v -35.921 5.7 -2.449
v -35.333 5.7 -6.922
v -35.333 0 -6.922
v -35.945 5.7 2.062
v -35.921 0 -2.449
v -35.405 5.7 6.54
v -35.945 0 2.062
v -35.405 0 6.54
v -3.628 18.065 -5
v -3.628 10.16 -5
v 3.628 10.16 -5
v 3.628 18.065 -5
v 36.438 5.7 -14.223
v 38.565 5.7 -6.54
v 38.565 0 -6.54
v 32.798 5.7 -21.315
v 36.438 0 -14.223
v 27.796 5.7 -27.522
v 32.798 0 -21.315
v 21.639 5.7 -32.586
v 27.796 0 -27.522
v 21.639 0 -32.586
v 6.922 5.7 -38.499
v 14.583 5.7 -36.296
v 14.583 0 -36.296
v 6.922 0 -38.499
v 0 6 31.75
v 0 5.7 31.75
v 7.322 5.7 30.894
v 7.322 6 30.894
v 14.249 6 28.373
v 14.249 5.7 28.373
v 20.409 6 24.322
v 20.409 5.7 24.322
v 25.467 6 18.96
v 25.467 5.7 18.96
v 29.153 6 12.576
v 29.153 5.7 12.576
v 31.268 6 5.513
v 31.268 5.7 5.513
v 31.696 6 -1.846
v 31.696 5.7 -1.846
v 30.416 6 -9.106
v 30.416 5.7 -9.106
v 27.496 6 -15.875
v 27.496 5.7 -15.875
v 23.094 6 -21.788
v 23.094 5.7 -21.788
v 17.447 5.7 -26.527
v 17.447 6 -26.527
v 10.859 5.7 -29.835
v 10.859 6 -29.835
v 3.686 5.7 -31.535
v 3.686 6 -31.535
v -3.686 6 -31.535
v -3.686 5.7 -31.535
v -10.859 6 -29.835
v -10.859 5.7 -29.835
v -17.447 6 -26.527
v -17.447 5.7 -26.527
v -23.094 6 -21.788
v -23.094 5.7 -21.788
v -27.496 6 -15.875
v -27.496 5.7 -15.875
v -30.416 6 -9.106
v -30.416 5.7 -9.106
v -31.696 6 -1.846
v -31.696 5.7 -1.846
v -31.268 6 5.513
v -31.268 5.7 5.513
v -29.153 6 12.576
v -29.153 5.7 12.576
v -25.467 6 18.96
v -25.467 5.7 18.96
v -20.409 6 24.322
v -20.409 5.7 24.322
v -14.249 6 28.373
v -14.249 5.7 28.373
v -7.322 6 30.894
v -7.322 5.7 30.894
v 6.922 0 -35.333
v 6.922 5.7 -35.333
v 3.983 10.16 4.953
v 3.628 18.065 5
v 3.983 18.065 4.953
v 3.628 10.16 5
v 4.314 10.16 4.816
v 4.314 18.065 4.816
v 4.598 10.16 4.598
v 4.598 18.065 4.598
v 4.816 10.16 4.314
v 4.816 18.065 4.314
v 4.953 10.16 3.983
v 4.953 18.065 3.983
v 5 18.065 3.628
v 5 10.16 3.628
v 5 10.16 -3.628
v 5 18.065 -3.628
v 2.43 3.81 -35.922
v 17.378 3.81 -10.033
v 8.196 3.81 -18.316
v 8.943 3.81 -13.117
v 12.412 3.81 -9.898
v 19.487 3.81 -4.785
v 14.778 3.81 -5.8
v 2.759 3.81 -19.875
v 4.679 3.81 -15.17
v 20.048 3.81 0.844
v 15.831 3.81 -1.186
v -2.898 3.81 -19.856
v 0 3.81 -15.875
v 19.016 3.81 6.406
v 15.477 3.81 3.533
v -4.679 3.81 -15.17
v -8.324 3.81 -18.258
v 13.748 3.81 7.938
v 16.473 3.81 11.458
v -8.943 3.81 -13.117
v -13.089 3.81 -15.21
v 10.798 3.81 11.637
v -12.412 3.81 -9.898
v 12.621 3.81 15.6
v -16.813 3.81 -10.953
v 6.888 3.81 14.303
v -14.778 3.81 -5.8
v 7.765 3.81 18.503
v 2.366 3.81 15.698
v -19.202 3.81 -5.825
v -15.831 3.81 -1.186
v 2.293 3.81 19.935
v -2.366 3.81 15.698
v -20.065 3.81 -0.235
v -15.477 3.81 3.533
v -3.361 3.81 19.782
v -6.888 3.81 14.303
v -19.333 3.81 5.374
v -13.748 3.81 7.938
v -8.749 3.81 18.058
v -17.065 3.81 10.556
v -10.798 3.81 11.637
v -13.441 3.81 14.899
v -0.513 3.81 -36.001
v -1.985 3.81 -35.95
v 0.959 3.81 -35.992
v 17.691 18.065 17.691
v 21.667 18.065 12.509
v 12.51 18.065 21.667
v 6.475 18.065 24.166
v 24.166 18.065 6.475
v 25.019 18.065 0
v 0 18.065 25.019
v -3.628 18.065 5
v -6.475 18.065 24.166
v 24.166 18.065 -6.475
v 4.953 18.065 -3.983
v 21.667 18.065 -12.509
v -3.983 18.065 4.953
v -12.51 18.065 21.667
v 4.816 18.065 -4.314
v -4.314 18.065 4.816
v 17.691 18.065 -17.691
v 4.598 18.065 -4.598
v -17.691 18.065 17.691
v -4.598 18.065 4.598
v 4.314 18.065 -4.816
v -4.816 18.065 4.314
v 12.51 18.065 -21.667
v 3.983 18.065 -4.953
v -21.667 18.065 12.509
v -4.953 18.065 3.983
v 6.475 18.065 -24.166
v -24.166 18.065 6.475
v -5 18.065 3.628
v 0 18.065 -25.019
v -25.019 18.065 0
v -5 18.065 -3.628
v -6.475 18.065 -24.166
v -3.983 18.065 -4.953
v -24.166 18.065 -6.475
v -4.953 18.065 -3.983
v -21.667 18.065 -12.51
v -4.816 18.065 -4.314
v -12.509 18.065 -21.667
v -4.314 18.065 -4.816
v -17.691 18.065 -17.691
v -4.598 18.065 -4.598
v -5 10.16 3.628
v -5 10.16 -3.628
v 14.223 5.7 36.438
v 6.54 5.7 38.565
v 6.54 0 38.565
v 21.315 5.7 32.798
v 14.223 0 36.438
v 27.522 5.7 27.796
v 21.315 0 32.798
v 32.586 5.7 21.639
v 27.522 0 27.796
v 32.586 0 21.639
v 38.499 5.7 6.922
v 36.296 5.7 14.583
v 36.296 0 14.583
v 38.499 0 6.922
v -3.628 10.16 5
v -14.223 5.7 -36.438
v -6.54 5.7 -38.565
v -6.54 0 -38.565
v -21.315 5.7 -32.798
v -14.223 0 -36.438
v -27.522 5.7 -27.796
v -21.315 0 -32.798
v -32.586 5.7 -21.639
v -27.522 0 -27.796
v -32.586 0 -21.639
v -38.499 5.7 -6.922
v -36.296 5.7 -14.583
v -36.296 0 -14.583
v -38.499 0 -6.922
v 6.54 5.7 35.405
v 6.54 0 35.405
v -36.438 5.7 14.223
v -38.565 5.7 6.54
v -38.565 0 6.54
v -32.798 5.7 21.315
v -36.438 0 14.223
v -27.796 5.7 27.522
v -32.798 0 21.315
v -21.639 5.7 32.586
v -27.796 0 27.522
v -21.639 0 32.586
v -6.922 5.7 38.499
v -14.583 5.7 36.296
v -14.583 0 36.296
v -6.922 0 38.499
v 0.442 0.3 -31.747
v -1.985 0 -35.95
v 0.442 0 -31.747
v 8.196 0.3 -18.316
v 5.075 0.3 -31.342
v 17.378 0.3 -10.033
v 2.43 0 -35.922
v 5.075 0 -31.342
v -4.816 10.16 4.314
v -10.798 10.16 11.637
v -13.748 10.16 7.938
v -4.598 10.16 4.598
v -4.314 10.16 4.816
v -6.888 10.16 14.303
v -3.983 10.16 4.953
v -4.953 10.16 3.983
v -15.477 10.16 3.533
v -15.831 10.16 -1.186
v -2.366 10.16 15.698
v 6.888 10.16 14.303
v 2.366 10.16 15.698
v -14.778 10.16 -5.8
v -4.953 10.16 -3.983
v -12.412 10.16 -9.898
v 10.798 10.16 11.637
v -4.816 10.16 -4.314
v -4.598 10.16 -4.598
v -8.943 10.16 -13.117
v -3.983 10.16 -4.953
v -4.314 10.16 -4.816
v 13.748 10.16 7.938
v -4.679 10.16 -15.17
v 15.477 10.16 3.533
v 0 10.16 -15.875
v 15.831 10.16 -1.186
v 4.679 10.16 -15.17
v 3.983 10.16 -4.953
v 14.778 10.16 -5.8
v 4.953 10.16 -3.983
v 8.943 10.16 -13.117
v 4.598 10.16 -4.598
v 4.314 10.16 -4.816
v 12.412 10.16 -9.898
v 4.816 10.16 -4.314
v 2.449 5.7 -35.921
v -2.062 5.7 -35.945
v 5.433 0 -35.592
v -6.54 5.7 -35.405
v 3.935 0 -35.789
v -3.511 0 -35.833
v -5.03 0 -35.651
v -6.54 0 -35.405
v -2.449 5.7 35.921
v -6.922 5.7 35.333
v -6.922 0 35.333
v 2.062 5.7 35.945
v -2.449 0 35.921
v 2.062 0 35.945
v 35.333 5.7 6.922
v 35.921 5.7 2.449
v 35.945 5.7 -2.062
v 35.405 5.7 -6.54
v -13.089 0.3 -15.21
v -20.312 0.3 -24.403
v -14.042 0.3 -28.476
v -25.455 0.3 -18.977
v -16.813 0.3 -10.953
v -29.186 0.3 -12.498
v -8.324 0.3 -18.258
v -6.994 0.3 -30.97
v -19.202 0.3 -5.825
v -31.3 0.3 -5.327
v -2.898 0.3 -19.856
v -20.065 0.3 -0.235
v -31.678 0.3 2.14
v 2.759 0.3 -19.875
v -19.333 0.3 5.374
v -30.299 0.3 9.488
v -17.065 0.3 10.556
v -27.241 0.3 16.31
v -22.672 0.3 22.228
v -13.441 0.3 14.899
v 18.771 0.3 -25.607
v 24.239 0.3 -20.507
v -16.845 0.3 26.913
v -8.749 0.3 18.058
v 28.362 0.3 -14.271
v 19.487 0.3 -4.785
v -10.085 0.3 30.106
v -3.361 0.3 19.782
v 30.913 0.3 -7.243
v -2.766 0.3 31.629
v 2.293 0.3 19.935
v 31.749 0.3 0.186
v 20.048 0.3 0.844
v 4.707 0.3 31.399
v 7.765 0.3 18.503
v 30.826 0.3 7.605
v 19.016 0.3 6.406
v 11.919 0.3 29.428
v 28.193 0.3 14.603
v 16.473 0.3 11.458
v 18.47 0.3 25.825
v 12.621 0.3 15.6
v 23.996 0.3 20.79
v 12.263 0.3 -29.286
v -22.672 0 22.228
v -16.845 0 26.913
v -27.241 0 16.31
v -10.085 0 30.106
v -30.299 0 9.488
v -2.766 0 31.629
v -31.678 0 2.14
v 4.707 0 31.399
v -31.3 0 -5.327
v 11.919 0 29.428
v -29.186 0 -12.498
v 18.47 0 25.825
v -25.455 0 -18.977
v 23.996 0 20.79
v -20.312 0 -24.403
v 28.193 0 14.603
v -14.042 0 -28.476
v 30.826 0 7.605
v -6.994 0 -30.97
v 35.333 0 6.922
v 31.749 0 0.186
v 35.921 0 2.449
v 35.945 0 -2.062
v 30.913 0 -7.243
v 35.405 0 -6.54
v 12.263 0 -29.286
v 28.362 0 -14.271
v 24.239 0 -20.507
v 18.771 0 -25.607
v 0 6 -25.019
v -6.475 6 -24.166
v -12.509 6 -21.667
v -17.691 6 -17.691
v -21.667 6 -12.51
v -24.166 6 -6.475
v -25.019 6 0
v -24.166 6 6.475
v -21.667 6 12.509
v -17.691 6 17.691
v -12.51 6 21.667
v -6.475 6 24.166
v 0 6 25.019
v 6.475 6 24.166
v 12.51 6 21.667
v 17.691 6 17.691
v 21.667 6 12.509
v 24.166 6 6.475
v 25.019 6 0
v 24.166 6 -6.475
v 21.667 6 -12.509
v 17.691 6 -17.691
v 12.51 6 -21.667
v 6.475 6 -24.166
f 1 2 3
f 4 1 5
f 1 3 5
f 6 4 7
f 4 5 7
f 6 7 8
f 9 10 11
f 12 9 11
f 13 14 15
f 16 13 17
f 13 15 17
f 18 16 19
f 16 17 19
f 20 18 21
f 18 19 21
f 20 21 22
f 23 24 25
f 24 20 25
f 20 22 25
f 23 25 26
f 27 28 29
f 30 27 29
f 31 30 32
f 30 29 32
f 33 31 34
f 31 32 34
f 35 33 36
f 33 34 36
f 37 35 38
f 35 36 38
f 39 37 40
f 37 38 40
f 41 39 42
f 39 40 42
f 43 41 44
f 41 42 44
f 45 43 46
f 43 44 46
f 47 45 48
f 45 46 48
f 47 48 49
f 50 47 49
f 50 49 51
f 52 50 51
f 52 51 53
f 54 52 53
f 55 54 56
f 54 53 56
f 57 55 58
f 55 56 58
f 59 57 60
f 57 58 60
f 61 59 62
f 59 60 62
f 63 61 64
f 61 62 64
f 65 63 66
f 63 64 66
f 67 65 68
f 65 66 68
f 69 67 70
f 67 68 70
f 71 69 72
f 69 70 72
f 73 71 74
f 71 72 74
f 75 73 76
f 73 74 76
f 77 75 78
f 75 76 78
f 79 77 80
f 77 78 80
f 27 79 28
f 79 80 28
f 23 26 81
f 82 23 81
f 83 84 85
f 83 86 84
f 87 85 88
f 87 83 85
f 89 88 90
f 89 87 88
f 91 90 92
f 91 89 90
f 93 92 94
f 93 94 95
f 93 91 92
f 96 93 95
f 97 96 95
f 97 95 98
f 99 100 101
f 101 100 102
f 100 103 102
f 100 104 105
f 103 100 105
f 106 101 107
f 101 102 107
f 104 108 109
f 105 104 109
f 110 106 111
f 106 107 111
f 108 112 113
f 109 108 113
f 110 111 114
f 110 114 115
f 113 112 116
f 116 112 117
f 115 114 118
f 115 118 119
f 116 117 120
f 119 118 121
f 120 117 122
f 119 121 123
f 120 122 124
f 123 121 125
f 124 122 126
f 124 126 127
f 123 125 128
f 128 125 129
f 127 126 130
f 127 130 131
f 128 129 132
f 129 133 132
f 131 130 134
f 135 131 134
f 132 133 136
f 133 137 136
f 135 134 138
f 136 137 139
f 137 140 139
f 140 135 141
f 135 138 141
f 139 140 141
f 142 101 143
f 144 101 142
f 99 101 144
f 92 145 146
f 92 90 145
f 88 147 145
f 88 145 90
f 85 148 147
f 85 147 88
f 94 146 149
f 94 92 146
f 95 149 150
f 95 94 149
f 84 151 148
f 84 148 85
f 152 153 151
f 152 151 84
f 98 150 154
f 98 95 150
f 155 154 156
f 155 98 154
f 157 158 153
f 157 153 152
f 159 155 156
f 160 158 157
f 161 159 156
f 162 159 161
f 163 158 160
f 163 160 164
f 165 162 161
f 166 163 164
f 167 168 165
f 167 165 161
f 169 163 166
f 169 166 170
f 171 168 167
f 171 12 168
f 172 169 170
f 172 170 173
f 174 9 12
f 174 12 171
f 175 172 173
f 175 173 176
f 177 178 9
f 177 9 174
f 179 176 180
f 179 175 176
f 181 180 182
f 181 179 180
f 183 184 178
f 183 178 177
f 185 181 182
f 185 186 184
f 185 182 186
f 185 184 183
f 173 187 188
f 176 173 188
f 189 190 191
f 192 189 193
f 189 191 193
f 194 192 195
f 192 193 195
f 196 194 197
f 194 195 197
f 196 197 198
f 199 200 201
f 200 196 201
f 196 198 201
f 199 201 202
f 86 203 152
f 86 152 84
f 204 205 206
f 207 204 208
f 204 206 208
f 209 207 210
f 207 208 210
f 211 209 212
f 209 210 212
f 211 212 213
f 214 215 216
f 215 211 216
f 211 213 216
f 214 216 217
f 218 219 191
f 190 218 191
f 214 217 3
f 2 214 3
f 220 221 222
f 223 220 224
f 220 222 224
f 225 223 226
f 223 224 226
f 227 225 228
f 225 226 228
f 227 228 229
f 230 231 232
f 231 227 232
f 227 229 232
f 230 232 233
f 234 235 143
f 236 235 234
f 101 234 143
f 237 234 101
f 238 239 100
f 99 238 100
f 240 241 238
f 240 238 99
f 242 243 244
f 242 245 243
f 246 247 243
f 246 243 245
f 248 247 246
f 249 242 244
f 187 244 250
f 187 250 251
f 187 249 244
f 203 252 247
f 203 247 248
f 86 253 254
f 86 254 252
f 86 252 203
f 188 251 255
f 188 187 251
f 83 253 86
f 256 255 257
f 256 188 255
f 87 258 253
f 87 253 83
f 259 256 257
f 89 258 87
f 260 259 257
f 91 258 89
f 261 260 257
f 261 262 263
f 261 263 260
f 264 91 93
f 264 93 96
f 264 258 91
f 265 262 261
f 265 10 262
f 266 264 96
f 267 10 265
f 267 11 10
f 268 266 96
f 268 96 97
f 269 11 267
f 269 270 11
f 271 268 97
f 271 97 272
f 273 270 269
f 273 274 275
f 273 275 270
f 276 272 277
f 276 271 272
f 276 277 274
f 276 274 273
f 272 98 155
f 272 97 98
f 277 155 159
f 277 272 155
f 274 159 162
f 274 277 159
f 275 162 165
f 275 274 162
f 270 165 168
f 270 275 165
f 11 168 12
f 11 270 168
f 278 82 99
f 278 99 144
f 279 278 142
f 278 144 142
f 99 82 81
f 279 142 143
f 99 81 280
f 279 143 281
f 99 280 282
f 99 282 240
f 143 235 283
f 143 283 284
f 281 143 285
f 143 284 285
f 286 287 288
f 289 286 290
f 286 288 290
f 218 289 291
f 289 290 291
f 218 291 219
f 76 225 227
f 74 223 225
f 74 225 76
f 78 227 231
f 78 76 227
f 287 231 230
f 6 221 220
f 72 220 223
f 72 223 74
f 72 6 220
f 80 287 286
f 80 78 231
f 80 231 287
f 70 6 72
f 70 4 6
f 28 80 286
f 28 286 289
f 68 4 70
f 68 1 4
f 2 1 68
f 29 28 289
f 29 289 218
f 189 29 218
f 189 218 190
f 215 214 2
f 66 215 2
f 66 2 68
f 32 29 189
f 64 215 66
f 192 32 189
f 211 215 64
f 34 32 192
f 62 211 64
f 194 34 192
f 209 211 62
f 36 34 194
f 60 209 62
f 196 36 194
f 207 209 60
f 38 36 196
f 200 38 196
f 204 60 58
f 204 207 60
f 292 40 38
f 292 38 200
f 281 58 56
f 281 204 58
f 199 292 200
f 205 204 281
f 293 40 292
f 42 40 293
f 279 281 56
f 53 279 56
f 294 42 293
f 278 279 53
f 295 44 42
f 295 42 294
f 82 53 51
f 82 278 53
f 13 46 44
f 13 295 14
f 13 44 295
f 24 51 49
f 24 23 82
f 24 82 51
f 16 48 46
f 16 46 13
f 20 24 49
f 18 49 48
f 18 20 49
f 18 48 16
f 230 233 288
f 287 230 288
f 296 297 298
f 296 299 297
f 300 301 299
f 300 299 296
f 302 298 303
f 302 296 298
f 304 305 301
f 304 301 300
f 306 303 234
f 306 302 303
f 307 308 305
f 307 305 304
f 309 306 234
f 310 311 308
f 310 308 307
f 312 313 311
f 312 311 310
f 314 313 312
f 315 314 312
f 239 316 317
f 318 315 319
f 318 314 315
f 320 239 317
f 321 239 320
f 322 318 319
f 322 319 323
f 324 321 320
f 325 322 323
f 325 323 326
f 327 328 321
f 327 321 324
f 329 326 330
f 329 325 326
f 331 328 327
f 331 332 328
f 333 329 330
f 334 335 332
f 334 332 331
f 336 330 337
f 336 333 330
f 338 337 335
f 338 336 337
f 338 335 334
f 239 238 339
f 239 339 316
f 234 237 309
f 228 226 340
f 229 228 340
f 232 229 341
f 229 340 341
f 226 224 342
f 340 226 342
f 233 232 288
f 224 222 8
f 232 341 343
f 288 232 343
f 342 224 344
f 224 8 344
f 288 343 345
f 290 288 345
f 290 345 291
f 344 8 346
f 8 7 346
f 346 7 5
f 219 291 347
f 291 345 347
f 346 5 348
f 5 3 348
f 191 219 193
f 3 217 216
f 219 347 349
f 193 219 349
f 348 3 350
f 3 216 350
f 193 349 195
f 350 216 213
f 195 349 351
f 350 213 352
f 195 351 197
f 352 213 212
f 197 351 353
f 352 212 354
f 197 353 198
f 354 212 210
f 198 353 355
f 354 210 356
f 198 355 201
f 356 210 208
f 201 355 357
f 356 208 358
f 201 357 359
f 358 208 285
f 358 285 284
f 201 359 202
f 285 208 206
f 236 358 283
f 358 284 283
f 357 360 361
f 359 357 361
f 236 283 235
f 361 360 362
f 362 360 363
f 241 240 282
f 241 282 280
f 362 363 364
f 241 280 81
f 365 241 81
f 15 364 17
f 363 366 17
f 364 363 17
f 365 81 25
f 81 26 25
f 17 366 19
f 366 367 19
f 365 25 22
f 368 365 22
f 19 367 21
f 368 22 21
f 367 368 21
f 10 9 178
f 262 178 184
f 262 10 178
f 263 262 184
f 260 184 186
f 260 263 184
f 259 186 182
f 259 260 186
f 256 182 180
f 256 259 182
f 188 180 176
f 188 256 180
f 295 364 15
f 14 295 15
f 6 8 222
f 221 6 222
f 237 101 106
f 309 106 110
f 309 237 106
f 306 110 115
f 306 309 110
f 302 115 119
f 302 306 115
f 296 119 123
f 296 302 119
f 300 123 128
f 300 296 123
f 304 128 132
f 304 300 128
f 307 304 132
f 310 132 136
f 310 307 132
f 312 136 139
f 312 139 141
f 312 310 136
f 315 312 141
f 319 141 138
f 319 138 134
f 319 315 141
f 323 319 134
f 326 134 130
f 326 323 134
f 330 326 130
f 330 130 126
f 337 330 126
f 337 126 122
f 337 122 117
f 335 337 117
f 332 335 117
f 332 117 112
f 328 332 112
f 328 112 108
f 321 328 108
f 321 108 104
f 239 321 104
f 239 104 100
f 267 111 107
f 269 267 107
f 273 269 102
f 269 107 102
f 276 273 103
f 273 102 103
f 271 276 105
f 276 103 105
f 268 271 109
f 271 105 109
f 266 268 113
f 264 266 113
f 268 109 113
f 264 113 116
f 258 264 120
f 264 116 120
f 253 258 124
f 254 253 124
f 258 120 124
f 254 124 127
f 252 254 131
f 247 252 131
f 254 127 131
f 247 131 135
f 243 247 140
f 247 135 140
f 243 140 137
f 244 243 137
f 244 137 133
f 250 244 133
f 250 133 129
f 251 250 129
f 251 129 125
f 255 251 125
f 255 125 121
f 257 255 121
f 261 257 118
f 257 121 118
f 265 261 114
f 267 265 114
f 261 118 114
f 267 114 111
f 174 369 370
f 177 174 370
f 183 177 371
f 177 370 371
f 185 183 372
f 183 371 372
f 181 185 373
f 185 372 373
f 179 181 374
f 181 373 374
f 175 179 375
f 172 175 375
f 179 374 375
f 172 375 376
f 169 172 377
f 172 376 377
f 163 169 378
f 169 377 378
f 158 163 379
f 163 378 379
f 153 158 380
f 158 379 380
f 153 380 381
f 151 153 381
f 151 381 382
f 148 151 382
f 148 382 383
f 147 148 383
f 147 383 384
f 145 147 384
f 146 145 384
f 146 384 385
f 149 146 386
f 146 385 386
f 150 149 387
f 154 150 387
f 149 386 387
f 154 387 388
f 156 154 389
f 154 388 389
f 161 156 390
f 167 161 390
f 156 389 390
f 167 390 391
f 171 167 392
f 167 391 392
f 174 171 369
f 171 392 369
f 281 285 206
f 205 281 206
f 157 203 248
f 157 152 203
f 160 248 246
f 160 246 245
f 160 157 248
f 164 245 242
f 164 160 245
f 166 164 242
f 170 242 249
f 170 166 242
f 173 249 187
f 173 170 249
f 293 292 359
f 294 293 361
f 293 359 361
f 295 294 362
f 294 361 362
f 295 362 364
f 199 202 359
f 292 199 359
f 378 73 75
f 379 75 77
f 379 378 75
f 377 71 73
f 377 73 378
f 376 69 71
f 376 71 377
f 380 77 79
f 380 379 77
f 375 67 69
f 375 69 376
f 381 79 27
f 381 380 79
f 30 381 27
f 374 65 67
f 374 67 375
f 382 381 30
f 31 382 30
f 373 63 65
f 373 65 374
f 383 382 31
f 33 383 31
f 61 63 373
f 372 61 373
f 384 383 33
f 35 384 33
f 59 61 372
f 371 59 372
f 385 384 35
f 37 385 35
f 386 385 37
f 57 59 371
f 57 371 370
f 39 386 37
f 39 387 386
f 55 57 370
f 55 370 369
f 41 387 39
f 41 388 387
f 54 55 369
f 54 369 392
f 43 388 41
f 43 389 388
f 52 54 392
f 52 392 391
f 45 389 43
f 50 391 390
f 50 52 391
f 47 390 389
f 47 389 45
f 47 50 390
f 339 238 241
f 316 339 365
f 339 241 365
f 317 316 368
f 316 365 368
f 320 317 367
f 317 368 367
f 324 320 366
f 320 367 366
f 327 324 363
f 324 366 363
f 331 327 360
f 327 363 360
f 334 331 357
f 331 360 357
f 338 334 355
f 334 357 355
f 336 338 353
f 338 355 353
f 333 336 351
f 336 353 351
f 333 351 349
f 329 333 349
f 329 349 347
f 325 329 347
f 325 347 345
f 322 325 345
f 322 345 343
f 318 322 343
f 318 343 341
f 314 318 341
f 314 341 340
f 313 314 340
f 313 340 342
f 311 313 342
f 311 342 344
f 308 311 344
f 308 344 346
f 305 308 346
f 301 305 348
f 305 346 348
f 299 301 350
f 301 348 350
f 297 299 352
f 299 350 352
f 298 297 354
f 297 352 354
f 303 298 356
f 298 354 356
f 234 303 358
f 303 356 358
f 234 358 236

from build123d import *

# Parameters (mm, degrees)
SKETCH1_W           = 10
SKETCH1_H           = 10
BOSS_EXTRUDE2_DEPTH = 6
CUT_EXTRUDE1_DEPTH  = 3.81
SKETCH3_R           = 31.75
CUT_EXTRUDE2_DEPTH  = 0.3
SKETCH4_R           = 25.019
SKETCH4_W           = 10
SKETCH4_H           = 10
BOSS_EXTRUDE3_DEPTH = 12.065
SKETCH5_R           = 15.875
CUT_EXTRUDE3_DEPTH  = 6.35
FILLET1_R           = 1.3716
CUT_EXTRUDE4_START  = -0.3
SKETCH6_R           = 54.970137174
SKETCH6_R_2         = 31.75
CUT_EXTRUDE4_DEPTH  = 0.3


with BuildPart() as part:
    # Sketch1 → Boss-Extrude2 (new body)
    with BuildSketch(Plane(origin=(0, 0, 0), x_dir=(1, 0, 0), z_dir=(0, 1, 0))):
        with BuildLine():
            Line((35.405449863, 6.5405), (38.565312338, 6.5405))
            ThreePointArc((38.565312338, 6.5405), (27.795594479, 27.522107178), (6.9215, 38.498757042))
            Line((6.9215, 38.498757042), (6.9215, 35.332942957))
            ThreePointArc((6.9215, 35.332942957), (0.19391896, 36.003977776), (-6.5405, 35.405449863))
            Line((-6.5405, 35.405449863), (-6.5405, 38.565312338))
            ThreePointArc((-6.5405, 38.565312338), (-27.522107178, 27.795594479), (-38.498757042, 6.9215))
            Line((-38.498757042, 6.9215), (-35.332942957, 6.9215))
            ThreePointArc((-35.332942957, 6.9215), (-36.003977776, 0.19391896), (-35.405449863, -6.5405))
            Line((-35.405449863, -6.5405), (-38.565312338, -6.5405))
            ThreePointArc((-38.565312338, -6.5405), (-27.795594479, -27.522107178), (-6.9215, -38.498757042))
            Line((-6.9215, -38.498757042), (-6.9215, -35.332942957))
            ThreePointArc((-6.9215, -35.332942957), (-0.19391896, -36.003977776), (6.5405, -35.405449863))
            Line((6.5405, -35.405449863), (6.5405, -38.565312338))
            ThreePointArc((6.5405, -38.565312338), (27.522107178, -27.795594479), (38.498757042, -6.9215))
            Line((38.498757042, -6.9215), (35.332942957, -6.9215))
            ThreePointArc((35.332942957, -6.9215), (36.003977776, -0.19391896), (35.405449863, 6.5405))
        make_face()
        Rectangle(SKETCH1_W, SKETCH1_H, mode=Mode.SUBTRACT)
    extrude(amount=BOSS_EXTRUDE2_DEPTH)

    # Sketch2 → Cut-Extrude1 (cut)
    with BuildSketch(Plane.XZ):
        with BuildLine():
            Line((17.377665752, -10.033), (-0.286554615, -40.628327152))
            ThreePointArc((-0.286554615, -40.628327152), (-2.416432138, -40.557415308), (-4.539661745, -40.374924792))
            Line((-4.539661745, -40.374924792), (8.196212586, -18.315743371))
            ThreePointArc((8.196212586, -18.315743371), (-13.440862054, 14.899247741), (17.377665752, -10.033))
        make_face()
    extrude(amount=-CUT_EXTRUDE1_DEPTH, mode=Mode.SUBTRACT)

    # Sketch3 → Cut-Extrude2 (cut)
    with BuildSketch(Plane.XZ):
        Circle(SKETCH3_R)
    extrude(amount=-CUT_EXTRUDE2_DEPTH, mode=Mode.SUBTRACT)

    # Sketch4 → Boss-Extrude3 (add)
    with BuildSketch(Plane(origin=(0, 6, 0), x_dir=(1, 0, 0), z_dir=(0, 1, 0))):
        with Locations(Location((0, 0, 0), (0, 0, 90))):
            Circle(SKETCH4_R)
        Rectangle(SKETCH4_W, SKETCH4_H, mode=Mode.SUBTRACT)
    extrude(amount=BOSS_EXTRUDE3_DEPTH)

    # Sketch5 → Cut-Extrude3 (cut)
    with BuildSketch(Plane.XZ.offset(-3.81)):
        with Locations(Location((0, 0, 0), (0, 0, 270))):
            Circle(SKETCH5_R)
    extrude(amount=-CUT_EXTRUDE3_DEPTH, mode=Mode.SUBTRACT)

    # Fillet1
    fillet1_edges = [part.edges().sort_by_distance(p)[0] for p in [
        (5, 14.1125, -5),
        (-5, 14.1125, -5),
        (-5, 14.1125, 5),
        (5, 14.1125, 5),
    ]]
    fillet(fillet1_edges, radius=FILLET1_R)

    # Sketch6 → Cut-Extrude4 (cut)
    with BuildSketch(Plane(origin=(0, 6, 0), x_dir=(1, 0, 0), z_dir=(0, 1, 0)).offset(CUT_EXTRUDE4_START)):
        Circle(SKETCH6_R)
        with Locations(Location((0, 0, 0), (0, 0, 270))):
            Circle(SKETCH6_R_2, mode=Mode.SUBTRACT)
    extrude(amount=CUT_EXTRUDE4_DEPTH, mode=Mode.SUBTRACT)


solid = part.part
